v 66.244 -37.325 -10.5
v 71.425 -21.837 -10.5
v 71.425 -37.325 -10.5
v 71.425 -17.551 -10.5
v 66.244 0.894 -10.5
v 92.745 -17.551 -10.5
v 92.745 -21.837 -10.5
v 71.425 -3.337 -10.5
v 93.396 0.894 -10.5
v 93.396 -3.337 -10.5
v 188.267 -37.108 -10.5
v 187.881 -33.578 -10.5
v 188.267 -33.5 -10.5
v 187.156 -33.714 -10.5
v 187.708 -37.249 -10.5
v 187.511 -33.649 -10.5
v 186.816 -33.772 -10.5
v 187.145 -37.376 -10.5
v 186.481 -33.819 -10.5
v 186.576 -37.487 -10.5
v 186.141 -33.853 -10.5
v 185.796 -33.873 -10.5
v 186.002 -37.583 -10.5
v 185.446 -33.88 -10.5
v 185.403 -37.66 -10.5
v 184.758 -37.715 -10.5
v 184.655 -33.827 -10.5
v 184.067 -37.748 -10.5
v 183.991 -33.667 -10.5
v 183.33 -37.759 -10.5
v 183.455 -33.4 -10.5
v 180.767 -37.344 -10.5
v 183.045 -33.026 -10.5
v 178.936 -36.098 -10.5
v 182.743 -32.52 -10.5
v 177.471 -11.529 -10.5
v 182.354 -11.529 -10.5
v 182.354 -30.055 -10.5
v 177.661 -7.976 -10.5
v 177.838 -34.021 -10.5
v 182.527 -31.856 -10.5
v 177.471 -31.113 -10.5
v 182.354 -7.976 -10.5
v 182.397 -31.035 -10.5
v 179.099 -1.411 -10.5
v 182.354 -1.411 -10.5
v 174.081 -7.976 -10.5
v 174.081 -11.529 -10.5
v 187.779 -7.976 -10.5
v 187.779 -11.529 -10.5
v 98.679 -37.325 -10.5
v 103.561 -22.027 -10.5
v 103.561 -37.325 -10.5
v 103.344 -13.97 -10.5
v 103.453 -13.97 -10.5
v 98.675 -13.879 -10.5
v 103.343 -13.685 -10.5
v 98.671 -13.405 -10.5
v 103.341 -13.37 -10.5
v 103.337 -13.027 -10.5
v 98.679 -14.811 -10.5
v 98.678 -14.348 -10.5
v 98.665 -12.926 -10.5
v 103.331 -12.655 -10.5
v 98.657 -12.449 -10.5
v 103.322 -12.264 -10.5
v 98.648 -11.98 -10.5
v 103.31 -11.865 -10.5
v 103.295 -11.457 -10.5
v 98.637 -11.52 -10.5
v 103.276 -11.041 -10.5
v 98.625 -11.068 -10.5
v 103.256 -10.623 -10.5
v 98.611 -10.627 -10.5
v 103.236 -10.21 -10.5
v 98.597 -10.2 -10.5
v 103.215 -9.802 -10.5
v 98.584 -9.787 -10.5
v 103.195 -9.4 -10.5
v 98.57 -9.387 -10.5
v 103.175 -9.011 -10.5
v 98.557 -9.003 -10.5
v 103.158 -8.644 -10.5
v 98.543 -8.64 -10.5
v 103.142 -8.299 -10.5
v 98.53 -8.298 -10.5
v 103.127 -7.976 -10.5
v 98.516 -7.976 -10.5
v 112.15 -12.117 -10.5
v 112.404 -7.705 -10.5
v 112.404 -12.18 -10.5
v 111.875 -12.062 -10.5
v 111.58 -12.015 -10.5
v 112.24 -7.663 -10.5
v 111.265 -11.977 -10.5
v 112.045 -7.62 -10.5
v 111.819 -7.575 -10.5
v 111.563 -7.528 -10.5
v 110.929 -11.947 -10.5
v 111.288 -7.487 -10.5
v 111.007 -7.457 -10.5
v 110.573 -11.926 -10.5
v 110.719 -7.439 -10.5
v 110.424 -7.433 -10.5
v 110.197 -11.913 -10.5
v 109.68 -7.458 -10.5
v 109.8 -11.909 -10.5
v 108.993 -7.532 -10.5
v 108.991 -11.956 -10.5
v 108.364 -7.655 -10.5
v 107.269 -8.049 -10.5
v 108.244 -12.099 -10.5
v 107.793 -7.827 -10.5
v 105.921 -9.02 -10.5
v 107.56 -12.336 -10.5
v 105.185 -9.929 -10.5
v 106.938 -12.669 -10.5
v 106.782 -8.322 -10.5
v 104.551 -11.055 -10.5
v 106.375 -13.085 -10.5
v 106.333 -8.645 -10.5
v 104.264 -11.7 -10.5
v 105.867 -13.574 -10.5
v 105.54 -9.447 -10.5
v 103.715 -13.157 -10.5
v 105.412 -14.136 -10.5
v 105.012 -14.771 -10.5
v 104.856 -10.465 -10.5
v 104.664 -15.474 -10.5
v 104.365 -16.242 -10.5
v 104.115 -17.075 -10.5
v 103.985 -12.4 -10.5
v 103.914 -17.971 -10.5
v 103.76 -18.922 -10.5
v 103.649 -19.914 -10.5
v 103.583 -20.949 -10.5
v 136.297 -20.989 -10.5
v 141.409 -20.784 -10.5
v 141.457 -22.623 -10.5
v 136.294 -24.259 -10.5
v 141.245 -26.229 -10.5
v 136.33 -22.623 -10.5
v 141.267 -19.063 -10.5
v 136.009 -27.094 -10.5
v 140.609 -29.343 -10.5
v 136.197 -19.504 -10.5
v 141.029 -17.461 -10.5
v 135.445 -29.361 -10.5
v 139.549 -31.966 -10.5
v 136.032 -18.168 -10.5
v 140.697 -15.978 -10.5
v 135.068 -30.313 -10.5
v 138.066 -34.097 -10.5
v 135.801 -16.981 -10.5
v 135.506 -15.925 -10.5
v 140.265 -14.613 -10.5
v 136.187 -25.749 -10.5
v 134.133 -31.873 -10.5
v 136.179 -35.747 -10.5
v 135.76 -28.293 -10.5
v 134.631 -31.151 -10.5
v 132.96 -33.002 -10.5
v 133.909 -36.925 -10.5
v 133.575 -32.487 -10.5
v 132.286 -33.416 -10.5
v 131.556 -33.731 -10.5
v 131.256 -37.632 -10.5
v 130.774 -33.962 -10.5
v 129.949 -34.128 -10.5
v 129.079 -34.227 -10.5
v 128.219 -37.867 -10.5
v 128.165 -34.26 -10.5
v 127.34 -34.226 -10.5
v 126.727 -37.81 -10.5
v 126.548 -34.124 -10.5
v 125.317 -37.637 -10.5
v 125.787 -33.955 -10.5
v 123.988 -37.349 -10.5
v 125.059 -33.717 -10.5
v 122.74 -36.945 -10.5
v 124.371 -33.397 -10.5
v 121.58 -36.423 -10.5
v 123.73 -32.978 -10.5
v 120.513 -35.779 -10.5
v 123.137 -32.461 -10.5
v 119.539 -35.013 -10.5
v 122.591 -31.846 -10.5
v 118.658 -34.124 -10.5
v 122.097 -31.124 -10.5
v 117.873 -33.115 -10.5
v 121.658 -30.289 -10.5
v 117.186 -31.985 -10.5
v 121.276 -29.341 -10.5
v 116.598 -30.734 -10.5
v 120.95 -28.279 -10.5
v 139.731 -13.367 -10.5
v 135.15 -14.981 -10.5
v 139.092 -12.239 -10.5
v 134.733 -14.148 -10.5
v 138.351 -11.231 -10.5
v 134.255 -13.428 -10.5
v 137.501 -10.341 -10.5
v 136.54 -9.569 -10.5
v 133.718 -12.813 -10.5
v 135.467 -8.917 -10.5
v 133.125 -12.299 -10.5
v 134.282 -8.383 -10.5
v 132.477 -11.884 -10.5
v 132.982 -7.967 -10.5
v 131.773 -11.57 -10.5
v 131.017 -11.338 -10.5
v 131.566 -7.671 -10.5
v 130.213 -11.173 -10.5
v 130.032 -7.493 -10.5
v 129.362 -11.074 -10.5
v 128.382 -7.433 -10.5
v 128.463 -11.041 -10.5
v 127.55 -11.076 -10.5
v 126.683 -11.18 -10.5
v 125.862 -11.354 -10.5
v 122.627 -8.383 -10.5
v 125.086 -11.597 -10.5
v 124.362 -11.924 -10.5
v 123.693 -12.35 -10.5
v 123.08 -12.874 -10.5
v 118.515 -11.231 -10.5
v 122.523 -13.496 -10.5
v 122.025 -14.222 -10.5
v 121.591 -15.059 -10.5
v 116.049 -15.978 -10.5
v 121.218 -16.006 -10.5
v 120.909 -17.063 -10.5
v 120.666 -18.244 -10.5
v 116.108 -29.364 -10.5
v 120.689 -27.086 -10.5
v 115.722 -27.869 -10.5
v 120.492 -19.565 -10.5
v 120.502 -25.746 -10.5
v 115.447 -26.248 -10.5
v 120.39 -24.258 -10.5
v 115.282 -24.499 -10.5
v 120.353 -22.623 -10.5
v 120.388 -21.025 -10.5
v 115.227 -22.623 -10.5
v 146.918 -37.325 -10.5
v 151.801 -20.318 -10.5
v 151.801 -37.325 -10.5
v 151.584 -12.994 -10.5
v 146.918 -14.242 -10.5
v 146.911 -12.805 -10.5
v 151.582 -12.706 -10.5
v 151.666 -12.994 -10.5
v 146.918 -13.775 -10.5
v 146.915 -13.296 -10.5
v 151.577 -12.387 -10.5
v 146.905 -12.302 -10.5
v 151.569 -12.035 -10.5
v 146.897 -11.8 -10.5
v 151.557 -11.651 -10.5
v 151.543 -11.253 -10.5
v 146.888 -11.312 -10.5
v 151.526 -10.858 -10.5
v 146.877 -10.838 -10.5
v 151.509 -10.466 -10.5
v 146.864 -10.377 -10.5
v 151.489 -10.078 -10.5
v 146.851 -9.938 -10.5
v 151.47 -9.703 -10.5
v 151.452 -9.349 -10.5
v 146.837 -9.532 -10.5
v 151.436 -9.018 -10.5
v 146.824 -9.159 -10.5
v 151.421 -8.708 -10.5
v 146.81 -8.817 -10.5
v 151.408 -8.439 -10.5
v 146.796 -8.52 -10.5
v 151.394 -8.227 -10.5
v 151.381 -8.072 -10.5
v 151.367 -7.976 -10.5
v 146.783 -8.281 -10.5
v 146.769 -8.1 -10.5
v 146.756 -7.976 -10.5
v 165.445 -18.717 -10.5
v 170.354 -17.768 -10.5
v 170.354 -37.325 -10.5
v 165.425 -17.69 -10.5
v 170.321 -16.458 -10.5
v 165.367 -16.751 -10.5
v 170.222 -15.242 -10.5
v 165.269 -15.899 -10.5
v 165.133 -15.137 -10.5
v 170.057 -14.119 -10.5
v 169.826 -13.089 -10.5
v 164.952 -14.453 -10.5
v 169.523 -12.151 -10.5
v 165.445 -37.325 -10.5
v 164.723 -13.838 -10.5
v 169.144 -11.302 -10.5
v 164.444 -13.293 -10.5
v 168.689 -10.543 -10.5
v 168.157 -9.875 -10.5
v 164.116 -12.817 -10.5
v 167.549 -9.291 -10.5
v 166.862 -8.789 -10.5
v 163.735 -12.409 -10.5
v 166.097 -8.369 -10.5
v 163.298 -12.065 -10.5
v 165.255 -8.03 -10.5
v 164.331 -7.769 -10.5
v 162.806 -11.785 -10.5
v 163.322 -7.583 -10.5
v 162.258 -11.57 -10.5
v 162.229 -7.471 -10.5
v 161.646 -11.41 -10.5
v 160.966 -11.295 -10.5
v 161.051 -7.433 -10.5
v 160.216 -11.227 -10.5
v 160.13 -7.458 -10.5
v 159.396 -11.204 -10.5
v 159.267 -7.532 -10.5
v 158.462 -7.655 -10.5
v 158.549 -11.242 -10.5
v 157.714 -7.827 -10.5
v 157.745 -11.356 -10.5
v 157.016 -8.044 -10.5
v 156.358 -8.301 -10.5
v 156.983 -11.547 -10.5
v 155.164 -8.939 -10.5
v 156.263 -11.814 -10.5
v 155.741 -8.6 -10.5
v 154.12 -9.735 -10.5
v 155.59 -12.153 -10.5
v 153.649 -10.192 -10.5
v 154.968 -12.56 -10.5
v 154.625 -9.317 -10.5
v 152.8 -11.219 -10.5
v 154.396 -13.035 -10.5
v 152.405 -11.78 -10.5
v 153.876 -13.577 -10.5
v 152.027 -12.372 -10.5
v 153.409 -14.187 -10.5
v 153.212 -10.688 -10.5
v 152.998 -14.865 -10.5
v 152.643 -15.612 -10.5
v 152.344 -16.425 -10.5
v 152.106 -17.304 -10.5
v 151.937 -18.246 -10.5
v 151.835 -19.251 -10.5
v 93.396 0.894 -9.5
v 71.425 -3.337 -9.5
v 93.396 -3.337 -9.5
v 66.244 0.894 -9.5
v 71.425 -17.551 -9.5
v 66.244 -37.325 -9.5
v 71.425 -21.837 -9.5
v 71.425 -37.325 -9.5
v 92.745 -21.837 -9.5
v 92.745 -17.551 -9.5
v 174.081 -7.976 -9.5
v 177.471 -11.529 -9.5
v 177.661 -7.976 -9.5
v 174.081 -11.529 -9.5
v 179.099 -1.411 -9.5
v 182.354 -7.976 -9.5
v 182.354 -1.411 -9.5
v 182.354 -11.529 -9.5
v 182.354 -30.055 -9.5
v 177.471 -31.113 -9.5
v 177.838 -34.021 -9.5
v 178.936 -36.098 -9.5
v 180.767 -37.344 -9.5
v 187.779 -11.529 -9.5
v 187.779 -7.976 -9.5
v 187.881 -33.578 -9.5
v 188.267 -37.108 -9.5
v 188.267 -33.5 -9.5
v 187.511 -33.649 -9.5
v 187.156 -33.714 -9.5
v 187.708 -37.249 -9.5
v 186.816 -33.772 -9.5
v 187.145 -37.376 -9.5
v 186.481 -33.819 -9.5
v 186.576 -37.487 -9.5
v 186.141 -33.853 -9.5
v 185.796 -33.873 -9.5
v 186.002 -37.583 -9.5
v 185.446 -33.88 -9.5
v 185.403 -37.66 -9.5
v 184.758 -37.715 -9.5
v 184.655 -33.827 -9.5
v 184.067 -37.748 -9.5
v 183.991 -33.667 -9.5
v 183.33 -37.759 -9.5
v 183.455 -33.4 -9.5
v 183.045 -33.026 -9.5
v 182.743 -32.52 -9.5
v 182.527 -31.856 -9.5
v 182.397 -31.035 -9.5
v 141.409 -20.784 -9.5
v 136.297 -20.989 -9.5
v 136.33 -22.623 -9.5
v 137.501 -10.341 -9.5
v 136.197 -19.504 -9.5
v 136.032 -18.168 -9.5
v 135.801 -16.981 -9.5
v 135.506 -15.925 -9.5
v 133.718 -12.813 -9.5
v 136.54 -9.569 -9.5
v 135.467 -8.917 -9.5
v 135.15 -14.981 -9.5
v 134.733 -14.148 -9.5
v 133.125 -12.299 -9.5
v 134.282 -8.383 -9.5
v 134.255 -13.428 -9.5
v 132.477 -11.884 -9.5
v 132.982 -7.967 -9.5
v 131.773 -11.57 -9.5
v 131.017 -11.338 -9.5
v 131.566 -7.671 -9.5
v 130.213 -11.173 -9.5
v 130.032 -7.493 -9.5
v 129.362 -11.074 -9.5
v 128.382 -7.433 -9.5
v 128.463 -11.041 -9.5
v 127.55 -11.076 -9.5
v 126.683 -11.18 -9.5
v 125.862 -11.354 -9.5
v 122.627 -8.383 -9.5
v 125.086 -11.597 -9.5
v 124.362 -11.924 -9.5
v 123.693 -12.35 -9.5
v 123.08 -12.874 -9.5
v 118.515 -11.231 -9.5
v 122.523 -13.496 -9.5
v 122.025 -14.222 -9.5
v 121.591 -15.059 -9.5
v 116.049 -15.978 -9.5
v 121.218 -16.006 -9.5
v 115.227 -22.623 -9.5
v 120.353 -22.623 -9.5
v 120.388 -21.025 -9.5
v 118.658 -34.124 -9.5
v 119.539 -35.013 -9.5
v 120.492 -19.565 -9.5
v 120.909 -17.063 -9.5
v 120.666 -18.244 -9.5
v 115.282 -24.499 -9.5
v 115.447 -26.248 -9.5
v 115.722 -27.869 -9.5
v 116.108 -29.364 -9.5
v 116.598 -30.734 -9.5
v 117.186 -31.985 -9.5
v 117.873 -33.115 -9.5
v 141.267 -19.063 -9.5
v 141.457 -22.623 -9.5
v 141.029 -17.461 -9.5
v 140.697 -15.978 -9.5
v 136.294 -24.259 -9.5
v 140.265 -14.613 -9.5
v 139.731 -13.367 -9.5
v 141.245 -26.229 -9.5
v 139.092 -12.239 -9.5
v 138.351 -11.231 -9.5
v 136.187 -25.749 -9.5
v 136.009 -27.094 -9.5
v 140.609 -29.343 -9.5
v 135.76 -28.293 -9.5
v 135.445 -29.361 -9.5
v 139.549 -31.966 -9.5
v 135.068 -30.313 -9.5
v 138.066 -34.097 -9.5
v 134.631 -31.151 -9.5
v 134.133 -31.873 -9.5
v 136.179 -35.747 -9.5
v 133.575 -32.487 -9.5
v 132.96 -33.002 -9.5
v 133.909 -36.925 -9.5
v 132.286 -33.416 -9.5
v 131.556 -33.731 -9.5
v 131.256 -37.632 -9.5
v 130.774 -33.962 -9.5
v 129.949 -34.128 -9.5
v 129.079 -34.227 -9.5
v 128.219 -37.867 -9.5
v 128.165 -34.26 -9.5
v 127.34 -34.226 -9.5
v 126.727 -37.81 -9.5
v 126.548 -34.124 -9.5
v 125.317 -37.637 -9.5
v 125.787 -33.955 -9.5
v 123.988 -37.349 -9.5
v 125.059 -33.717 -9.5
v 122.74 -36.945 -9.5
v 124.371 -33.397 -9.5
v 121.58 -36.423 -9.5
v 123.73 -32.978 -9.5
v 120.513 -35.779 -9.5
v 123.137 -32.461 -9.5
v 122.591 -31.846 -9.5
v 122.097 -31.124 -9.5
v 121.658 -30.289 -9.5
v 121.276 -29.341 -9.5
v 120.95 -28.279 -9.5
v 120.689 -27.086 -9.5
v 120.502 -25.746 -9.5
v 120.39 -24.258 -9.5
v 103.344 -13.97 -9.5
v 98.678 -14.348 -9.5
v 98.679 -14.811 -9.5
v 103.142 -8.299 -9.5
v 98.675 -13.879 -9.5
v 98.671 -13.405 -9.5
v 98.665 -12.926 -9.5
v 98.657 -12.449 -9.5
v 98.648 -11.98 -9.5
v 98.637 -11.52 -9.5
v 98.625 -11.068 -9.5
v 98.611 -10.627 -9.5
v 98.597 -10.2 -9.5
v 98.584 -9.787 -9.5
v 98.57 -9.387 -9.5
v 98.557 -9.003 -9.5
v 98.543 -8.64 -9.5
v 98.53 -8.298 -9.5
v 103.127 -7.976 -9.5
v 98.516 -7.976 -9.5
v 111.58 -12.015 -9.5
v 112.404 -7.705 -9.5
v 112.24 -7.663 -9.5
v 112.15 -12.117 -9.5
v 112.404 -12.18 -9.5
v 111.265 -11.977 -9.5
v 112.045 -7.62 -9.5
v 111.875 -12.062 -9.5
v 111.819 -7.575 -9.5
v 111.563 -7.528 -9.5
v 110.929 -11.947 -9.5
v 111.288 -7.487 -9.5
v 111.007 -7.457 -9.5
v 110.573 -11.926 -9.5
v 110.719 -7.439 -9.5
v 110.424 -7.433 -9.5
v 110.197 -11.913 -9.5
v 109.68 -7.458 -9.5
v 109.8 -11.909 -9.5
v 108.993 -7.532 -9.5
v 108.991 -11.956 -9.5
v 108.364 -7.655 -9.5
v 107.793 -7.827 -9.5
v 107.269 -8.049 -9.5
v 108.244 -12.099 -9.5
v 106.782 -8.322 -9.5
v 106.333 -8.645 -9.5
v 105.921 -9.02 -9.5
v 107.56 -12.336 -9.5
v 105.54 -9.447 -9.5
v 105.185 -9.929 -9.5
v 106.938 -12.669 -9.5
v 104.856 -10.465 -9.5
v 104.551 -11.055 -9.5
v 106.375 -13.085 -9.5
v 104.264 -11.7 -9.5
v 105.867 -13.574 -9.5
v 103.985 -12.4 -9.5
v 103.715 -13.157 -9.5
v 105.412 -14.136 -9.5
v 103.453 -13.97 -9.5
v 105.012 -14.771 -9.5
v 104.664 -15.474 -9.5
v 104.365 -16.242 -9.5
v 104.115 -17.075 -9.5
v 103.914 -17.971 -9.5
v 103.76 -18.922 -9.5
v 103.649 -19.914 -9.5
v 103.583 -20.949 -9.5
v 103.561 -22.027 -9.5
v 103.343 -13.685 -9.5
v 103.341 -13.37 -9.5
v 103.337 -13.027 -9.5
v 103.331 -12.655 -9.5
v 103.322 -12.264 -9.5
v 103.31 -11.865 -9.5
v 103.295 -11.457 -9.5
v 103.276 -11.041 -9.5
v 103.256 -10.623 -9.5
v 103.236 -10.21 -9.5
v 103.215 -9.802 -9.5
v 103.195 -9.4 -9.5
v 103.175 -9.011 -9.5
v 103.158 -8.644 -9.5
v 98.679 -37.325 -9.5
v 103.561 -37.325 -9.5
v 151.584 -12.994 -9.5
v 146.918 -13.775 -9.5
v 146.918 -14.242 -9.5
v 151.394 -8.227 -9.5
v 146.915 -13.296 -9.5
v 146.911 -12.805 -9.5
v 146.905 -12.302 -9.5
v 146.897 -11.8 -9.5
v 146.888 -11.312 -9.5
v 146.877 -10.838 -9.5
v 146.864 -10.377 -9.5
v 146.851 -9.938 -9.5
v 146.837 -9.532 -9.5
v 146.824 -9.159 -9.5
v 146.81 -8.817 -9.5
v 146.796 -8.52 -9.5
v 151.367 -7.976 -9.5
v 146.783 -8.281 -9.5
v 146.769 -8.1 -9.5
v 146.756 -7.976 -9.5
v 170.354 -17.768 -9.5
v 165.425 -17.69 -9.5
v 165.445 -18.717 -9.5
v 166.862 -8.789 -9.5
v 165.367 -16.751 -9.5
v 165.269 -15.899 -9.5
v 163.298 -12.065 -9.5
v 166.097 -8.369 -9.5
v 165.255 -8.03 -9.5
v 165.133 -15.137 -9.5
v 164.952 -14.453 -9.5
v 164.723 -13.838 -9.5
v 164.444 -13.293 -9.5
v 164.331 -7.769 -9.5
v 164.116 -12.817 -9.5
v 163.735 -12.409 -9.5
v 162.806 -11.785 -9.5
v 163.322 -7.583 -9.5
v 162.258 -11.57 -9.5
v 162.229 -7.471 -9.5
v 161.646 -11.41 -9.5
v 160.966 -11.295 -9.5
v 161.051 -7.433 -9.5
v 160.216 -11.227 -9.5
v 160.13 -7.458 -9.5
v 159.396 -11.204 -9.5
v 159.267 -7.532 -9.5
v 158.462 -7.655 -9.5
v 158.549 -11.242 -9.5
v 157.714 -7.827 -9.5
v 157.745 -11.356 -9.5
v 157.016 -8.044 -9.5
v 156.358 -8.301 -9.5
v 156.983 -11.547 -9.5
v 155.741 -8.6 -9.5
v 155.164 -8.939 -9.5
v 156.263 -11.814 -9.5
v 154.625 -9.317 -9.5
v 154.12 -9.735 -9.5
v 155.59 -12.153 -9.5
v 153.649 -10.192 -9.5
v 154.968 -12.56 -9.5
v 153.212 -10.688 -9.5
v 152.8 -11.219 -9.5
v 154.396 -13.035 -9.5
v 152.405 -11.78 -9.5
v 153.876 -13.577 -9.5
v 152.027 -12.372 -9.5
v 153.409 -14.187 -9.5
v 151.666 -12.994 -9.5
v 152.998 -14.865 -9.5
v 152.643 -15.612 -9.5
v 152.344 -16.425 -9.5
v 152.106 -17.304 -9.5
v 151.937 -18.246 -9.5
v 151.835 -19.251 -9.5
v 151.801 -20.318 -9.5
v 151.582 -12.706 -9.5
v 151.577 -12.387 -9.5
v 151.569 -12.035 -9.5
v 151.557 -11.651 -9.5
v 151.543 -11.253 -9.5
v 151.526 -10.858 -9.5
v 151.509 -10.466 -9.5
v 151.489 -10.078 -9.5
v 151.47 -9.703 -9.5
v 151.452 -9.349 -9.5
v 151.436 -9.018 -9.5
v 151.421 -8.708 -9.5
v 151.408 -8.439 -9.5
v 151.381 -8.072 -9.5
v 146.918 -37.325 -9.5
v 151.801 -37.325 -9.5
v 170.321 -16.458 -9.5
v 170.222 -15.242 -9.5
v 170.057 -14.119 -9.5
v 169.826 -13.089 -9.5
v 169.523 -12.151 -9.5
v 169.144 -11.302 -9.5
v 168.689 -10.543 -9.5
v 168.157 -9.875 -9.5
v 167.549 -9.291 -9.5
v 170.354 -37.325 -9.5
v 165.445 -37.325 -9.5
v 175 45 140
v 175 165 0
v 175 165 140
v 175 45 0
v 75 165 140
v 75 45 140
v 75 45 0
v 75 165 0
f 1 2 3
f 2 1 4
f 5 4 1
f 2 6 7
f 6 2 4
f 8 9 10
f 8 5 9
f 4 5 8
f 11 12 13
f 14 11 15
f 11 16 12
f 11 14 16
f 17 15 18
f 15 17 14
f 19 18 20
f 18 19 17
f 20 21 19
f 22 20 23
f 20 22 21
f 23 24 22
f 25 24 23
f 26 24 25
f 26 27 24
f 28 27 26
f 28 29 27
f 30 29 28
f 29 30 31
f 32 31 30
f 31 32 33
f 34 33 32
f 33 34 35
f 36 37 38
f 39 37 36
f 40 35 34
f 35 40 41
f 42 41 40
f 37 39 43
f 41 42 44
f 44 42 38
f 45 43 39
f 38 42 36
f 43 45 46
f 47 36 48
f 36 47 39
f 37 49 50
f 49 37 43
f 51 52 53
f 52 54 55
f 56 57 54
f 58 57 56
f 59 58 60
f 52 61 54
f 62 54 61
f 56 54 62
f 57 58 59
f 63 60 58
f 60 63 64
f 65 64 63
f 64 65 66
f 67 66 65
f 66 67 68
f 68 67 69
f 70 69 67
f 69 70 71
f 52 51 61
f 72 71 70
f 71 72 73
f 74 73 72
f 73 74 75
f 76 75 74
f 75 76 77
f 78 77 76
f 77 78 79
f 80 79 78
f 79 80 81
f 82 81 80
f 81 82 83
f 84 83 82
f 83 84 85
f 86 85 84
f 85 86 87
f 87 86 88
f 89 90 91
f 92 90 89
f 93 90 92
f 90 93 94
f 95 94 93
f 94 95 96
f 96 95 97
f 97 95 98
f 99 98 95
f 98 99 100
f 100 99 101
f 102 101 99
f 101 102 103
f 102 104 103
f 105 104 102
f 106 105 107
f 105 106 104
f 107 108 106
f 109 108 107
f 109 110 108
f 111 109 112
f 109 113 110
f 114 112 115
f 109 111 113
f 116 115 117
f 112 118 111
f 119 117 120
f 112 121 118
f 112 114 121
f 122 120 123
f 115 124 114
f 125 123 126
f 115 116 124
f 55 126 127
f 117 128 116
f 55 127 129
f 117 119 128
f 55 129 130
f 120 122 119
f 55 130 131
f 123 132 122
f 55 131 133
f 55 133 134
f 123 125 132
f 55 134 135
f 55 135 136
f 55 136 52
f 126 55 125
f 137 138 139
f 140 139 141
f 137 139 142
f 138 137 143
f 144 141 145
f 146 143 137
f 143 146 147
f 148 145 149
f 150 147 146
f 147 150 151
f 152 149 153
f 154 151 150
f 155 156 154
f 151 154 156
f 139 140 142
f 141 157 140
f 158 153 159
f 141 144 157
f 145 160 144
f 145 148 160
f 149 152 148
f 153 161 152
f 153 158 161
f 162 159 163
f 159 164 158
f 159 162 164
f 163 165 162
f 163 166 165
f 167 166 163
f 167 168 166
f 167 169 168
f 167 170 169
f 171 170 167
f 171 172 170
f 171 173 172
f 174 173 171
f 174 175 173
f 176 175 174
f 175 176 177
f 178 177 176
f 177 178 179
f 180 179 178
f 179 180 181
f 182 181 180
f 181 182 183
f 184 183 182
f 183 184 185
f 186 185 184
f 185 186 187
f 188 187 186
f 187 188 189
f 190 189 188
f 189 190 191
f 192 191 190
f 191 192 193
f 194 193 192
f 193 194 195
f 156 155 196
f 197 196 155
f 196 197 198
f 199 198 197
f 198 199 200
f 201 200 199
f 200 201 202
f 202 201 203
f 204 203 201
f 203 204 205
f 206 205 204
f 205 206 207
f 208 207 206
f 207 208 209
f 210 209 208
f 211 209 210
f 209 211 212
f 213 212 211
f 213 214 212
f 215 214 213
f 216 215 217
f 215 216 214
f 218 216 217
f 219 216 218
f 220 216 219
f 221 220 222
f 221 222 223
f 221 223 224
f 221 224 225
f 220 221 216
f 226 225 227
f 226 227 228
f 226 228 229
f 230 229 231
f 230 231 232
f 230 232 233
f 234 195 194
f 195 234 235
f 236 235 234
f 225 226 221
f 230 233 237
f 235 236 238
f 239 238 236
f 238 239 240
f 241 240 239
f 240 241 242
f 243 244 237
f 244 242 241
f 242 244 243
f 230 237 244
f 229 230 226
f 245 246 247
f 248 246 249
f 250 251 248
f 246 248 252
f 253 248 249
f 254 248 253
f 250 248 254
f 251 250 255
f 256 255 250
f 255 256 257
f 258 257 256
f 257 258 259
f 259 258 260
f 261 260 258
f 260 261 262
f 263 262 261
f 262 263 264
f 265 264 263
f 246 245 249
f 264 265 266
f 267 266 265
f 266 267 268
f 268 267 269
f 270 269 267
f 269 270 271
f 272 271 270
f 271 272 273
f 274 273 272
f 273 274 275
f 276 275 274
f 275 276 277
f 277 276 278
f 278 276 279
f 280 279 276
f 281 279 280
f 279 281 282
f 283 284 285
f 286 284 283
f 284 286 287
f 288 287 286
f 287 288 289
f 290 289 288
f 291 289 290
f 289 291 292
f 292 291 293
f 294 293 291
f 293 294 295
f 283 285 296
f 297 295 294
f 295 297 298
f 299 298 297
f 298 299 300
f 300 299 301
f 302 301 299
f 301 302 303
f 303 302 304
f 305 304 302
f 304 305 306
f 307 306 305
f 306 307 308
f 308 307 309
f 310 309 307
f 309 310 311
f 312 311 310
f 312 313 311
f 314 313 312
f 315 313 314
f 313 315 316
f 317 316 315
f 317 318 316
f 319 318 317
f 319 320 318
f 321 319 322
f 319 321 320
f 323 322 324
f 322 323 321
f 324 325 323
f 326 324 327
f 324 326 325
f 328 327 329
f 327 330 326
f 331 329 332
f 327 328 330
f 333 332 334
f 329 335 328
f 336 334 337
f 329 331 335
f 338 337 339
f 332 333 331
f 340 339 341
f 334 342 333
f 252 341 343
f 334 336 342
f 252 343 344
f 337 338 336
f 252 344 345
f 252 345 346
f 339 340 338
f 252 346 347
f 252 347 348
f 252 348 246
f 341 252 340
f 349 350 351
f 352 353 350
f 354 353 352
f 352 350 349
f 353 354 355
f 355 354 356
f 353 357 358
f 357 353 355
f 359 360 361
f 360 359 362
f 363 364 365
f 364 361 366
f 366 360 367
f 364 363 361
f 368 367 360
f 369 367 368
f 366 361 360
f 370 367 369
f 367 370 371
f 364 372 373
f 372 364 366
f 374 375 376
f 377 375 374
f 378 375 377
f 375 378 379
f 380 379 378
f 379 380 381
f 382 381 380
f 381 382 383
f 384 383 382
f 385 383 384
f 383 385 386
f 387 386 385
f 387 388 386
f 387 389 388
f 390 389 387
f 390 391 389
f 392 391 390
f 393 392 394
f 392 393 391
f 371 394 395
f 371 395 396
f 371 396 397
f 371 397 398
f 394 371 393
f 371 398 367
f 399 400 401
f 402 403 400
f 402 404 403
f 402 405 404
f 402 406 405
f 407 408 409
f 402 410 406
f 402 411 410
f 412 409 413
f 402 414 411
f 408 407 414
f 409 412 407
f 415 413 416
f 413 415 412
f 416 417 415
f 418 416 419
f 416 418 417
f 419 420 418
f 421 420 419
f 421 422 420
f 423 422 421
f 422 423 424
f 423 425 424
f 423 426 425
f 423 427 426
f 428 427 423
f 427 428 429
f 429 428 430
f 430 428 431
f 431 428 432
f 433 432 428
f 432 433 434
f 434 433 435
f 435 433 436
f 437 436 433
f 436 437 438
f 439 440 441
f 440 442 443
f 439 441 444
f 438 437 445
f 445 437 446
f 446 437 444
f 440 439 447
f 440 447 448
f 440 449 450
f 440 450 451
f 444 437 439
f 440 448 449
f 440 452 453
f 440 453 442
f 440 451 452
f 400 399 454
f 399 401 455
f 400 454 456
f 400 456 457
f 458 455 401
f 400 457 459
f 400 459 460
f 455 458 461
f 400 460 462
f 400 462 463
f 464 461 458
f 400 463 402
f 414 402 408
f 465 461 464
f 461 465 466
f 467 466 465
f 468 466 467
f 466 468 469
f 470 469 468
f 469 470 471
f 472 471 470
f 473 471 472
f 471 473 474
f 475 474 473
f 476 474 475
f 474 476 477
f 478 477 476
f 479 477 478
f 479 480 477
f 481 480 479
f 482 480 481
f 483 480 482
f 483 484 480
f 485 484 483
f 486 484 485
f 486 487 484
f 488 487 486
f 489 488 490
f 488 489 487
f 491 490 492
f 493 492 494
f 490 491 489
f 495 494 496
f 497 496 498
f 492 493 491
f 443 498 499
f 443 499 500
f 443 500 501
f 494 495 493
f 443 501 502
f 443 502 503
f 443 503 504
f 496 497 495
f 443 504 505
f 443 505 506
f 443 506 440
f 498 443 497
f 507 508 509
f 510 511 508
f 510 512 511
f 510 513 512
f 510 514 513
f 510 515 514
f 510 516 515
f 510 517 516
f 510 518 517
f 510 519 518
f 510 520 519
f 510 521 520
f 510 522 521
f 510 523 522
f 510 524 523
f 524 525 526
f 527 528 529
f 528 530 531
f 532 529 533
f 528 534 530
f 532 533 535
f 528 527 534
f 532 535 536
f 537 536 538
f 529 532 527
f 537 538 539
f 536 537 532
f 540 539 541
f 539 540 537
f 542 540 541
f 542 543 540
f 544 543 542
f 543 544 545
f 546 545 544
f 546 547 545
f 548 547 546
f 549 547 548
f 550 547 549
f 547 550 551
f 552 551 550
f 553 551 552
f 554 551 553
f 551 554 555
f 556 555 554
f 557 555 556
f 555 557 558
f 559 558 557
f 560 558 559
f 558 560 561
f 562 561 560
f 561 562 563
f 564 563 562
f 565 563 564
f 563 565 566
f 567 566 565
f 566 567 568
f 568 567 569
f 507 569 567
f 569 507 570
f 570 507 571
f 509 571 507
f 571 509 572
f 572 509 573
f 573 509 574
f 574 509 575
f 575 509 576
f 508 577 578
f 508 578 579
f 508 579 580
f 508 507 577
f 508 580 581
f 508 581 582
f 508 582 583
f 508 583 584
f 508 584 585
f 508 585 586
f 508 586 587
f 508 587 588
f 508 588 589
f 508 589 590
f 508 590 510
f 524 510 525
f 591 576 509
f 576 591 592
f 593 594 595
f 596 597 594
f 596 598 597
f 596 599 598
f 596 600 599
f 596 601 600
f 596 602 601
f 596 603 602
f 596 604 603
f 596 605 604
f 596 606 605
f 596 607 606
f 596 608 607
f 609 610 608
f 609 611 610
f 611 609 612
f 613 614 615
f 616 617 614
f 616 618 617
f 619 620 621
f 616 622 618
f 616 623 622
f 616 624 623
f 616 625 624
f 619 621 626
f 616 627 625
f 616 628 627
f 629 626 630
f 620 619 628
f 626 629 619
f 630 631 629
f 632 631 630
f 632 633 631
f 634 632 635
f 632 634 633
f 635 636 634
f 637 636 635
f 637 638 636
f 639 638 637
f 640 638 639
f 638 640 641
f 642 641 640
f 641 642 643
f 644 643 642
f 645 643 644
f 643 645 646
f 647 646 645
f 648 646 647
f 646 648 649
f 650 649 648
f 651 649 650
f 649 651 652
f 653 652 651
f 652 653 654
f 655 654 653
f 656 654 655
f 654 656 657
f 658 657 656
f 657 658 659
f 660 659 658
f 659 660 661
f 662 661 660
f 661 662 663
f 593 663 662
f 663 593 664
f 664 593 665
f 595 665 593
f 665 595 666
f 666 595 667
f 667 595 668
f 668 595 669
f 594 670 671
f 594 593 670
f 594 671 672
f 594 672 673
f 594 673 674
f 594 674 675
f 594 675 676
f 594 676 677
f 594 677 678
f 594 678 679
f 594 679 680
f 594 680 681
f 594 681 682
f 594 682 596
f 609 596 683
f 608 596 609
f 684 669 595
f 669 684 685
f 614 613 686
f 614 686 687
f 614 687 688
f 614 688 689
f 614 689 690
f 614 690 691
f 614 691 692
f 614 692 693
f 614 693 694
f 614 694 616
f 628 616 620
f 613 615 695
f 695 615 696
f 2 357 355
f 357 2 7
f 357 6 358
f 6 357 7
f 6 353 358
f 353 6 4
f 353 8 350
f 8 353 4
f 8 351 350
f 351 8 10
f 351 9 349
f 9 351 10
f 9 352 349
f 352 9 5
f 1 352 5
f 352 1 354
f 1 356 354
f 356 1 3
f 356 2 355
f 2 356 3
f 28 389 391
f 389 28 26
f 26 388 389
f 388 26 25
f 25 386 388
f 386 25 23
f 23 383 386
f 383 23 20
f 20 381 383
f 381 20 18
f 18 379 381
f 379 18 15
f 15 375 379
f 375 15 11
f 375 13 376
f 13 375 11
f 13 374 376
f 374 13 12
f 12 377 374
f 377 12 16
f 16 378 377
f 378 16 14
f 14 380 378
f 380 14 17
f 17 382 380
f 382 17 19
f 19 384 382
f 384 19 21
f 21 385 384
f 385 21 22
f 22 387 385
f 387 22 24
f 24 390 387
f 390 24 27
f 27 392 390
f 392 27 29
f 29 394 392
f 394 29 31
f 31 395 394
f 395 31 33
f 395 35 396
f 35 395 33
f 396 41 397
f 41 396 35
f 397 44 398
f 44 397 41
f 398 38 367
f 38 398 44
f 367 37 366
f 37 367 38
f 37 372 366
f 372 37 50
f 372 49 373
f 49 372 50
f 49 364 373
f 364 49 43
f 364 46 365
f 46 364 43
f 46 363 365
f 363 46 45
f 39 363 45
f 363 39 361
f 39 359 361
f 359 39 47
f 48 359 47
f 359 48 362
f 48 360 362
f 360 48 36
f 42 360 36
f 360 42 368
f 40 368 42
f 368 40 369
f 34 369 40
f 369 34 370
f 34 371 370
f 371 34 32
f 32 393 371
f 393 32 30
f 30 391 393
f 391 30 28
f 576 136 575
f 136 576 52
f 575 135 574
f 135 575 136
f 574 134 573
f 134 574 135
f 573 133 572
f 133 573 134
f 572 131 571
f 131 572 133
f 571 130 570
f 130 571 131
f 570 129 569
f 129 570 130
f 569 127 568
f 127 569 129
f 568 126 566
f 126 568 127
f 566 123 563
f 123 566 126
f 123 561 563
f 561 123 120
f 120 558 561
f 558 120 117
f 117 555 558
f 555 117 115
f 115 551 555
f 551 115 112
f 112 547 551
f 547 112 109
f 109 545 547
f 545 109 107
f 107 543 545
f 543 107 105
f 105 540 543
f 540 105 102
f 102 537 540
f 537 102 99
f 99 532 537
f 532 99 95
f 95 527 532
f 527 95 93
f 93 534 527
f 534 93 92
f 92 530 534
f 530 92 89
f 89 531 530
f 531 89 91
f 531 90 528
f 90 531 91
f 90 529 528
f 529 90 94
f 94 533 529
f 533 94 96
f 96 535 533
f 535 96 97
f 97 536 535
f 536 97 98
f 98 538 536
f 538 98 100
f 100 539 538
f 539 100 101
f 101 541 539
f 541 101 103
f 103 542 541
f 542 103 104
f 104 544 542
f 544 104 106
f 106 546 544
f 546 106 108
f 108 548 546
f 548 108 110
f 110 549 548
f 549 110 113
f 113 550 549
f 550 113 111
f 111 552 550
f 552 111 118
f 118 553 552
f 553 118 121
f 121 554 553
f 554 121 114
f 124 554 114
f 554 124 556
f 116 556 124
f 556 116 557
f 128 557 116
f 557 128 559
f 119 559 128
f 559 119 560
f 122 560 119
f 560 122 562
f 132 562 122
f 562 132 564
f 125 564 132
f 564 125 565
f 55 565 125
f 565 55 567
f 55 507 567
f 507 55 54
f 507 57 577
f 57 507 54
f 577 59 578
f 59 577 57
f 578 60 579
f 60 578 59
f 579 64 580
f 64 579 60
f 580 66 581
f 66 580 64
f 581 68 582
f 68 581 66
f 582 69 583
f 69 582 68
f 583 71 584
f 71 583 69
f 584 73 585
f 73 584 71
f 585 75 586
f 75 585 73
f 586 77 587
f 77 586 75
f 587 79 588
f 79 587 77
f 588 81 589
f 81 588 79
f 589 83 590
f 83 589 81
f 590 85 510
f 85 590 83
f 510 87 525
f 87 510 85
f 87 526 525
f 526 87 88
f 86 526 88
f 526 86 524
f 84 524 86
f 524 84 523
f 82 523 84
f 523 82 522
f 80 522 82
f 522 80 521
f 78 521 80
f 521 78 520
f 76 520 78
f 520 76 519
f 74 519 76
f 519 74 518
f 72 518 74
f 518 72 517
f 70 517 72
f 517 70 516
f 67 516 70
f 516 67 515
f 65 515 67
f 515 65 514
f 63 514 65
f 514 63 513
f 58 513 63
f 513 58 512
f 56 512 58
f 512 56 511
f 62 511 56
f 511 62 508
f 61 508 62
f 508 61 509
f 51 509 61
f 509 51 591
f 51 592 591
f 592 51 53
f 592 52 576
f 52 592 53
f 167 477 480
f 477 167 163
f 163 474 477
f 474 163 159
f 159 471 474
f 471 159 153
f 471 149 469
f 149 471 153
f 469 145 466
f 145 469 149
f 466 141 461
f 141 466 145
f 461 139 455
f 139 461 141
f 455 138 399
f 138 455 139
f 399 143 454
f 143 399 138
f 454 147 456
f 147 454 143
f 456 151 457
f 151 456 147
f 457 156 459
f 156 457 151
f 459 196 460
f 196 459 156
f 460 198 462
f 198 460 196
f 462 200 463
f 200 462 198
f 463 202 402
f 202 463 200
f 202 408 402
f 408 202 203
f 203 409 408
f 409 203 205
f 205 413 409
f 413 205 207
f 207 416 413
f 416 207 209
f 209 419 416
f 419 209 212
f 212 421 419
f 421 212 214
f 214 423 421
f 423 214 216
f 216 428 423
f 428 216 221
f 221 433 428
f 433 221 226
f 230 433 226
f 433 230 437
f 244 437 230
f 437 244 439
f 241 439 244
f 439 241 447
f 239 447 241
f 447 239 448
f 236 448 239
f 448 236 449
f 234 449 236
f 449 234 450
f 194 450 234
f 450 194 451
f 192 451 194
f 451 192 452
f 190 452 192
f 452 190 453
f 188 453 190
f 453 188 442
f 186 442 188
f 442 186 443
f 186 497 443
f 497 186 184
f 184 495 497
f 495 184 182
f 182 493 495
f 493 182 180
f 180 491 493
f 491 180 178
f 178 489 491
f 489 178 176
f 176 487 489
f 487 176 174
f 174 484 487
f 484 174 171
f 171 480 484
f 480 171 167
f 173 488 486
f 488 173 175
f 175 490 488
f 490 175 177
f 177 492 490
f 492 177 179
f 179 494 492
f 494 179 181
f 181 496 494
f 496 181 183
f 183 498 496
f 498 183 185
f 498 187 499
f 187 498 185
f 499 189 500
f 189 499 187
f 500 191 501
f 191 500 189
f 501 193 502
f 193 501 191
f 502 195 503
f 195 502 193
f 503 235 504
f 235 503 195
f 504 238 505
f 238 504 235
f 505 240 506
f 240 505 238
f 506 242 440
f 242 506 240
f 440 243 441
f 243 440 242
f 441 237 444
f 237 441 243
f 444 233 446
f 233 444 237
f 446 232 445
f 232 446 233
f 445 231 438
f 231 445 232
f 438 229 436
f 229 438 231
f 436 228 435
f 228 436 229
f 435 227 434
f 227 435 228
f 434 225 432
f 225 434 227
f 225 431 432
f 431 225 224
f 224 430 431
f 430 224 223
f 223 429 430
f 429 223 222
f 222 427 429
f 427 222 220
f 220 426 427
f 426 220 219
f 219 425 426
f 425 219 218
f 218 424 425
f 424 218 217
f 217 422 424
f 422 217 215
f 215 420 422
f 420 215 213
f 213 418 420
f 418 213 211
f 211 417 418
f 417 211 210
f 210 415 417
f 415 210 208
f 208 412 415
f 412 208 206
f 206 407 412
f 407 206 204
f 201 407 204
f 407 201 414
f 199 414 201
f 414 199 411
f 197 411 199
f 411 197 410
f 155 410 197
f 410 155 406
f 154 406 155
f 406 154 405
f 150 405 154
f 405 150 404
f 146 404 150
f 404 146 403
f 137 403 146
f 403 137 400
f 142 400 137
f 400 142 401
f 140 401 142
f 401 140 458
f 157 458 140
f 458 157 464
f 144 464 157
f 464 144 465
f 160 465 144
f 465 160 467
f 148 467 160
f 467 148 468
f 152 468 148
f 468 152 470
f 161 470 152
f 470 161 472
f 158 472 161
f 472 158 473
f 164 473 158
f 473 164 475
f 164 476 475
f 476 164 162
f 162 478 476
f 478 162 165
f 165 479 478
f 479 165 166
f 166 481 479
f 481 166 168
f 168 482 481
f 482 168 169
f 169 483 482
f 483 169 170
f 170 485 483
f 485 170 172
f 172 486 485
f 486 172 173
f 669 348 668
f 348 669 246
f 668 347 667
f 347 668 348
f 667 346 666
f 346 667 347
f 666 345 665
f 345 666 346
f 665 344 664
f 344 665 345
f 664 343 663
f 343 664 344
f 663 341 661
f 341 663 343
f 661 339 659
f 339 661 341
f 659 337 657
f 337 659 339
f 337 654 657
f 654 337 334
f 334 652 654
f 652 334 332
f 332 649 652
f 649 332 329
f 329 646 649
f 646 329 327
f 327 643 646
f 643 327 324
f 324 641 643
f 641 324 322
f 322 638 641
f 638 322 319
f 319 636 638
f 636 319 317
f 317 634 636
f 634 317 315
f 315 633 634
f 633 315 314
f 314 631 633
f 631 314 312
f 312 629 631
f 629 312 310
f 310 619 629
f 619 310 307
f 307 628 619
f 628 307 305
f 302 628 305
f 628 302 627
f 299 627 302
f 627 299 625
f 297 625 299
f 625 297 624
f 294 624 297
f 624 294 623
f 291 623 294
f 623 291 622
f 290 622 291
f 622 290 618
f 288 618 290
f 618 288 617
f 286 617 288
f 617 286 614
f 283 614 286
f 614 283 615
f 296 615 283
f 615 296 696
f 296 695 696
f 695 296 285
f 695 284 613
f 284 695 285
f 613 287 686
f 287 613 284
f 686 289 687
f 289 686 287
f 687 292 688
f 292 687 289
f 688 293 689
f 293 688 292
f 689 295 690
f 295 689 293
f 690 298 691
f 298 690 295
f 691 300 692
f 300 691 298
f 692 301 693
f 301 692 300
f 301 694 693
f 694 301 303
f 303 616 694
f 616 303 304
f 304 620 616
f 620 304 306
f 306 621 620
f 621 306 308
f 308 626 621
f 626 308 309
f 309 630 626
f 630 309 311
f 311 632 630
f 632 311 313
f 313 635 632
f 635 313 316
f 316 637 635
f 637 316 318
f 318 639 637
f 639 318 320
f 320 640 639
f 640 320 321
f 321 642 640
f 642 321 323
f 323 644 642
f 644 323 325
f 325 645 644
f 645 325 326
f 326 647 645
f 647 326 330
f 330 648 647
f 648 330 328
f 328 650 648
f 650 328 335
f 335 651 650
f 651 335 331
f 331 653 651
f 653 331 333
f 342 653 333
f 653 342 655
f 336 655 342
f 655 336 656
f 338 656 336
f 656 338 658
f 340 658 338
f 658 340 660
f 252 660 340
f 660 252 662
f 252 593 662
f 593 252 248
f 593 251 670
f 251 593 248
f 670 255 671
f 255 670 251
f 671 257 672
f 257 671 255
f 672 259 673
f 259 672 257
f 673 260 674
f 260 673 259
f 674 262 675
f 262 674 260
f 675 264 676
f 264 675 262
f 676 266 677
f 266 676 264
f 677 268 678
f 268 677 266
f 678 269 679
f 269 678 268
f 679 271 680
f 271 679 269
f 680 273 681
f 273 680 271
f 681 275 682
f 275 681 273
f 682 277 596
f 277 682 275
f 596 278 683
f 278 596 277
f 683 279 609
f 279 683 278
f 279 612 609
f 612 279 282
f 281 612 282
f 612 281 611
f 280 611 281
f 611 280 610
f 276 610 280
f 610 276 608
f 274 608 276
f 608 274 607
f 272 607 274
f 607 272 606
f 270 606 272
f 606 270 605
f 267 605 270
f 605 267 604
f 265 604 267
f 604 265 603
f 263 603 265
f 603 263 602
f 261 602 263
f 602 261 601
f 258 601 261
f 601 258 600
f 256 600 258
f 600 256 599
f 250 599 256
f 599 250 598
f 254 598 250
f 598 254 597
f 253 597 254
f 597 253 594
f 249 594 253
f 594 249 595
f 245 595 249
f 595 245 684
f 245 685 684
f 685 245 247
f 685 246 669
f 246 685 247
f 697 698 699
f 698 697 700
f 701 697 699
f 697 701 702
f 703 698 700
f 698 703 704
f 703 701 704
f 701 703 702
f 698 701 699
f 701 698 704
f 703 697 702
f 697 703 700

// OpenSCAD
// Start: lazy_union
default_5_default_5();
// End: lazy_union

// Modules.

// 'PartMaterial undef-default - default 5.0'
module default_5_default_5() {
  // 'None : _combine_solids_and_holes'
  union() {
    // 'default : _combine_solids_and_holes'
    union() {
      // 'volume : _combine_solids_and_holes'
      union() {
        // 'volume'
        %color(c=[0.4980392156862745, 1.0, 0.8313725490196079, 0.3]) {
          // 'volume : _combine_solids_and_holes'
          union() {
            // 'volume'
            cube(size=[250.0, 210.0, 210.0]);
          }
        }
        // 'plate'
        %multmatrix(m=[[1.0, 0.0, 0.0, 0.0], [0.0, 1.0, 0.0, 0.0], [0.0, 0.0, 1.0, -4.005], [0.0, 0.0, 0.0, 1.0]]) {
          // 'plate'
          color(c=[0.6470588235294118, 0.16470588235294117, 0.16470588235294117, 0.3]) {
            // 'plate : _combine_solids_and_holes'
            union() {
              // 'plate'
              cube(size=[250.0, 210.0, 4.0]);
            }
          }
        }
        // 'front_label'
        multmatrix(m=[[1.0, 0.0, 0.0, 125.0], [0.0, 1.0, 0.0, 0.0], [0.0, 0.0, 1.0, -10.5], [0.0, 0.0, 0.0, 1.0]]) {
          // 'front_label : _combine_solids_and_holes'
          union() {
            // 'front_label'
            linear_extrude(height=1.0) {
              translate(v=[0.0, 0.0, -0.5]) {
                text(text="Front", size=40.0, halign="center", valign="top", spacing=1.0, direction="ltr");
              }
            }
          }
        }
      }
      // 'model'
      multmatrix(m=[[1.0, 0.0, 0.0, 75.0], [0.0, 1.0, 0.0, 45.0], [0.0, 0.0, 1.0, 0.0], [0.0, 0.0, 0.0, 1.0]]) {
        // 'model : _combine_solids_and_holes'
        union() {
          // 'default : _combine_solids_and_holes'
          union() {
            // 'default'
            cube(size=[100.0, 120.0, 140.0]);
          }
        }
      }
    }
  }
} // end module default_5_default_5
